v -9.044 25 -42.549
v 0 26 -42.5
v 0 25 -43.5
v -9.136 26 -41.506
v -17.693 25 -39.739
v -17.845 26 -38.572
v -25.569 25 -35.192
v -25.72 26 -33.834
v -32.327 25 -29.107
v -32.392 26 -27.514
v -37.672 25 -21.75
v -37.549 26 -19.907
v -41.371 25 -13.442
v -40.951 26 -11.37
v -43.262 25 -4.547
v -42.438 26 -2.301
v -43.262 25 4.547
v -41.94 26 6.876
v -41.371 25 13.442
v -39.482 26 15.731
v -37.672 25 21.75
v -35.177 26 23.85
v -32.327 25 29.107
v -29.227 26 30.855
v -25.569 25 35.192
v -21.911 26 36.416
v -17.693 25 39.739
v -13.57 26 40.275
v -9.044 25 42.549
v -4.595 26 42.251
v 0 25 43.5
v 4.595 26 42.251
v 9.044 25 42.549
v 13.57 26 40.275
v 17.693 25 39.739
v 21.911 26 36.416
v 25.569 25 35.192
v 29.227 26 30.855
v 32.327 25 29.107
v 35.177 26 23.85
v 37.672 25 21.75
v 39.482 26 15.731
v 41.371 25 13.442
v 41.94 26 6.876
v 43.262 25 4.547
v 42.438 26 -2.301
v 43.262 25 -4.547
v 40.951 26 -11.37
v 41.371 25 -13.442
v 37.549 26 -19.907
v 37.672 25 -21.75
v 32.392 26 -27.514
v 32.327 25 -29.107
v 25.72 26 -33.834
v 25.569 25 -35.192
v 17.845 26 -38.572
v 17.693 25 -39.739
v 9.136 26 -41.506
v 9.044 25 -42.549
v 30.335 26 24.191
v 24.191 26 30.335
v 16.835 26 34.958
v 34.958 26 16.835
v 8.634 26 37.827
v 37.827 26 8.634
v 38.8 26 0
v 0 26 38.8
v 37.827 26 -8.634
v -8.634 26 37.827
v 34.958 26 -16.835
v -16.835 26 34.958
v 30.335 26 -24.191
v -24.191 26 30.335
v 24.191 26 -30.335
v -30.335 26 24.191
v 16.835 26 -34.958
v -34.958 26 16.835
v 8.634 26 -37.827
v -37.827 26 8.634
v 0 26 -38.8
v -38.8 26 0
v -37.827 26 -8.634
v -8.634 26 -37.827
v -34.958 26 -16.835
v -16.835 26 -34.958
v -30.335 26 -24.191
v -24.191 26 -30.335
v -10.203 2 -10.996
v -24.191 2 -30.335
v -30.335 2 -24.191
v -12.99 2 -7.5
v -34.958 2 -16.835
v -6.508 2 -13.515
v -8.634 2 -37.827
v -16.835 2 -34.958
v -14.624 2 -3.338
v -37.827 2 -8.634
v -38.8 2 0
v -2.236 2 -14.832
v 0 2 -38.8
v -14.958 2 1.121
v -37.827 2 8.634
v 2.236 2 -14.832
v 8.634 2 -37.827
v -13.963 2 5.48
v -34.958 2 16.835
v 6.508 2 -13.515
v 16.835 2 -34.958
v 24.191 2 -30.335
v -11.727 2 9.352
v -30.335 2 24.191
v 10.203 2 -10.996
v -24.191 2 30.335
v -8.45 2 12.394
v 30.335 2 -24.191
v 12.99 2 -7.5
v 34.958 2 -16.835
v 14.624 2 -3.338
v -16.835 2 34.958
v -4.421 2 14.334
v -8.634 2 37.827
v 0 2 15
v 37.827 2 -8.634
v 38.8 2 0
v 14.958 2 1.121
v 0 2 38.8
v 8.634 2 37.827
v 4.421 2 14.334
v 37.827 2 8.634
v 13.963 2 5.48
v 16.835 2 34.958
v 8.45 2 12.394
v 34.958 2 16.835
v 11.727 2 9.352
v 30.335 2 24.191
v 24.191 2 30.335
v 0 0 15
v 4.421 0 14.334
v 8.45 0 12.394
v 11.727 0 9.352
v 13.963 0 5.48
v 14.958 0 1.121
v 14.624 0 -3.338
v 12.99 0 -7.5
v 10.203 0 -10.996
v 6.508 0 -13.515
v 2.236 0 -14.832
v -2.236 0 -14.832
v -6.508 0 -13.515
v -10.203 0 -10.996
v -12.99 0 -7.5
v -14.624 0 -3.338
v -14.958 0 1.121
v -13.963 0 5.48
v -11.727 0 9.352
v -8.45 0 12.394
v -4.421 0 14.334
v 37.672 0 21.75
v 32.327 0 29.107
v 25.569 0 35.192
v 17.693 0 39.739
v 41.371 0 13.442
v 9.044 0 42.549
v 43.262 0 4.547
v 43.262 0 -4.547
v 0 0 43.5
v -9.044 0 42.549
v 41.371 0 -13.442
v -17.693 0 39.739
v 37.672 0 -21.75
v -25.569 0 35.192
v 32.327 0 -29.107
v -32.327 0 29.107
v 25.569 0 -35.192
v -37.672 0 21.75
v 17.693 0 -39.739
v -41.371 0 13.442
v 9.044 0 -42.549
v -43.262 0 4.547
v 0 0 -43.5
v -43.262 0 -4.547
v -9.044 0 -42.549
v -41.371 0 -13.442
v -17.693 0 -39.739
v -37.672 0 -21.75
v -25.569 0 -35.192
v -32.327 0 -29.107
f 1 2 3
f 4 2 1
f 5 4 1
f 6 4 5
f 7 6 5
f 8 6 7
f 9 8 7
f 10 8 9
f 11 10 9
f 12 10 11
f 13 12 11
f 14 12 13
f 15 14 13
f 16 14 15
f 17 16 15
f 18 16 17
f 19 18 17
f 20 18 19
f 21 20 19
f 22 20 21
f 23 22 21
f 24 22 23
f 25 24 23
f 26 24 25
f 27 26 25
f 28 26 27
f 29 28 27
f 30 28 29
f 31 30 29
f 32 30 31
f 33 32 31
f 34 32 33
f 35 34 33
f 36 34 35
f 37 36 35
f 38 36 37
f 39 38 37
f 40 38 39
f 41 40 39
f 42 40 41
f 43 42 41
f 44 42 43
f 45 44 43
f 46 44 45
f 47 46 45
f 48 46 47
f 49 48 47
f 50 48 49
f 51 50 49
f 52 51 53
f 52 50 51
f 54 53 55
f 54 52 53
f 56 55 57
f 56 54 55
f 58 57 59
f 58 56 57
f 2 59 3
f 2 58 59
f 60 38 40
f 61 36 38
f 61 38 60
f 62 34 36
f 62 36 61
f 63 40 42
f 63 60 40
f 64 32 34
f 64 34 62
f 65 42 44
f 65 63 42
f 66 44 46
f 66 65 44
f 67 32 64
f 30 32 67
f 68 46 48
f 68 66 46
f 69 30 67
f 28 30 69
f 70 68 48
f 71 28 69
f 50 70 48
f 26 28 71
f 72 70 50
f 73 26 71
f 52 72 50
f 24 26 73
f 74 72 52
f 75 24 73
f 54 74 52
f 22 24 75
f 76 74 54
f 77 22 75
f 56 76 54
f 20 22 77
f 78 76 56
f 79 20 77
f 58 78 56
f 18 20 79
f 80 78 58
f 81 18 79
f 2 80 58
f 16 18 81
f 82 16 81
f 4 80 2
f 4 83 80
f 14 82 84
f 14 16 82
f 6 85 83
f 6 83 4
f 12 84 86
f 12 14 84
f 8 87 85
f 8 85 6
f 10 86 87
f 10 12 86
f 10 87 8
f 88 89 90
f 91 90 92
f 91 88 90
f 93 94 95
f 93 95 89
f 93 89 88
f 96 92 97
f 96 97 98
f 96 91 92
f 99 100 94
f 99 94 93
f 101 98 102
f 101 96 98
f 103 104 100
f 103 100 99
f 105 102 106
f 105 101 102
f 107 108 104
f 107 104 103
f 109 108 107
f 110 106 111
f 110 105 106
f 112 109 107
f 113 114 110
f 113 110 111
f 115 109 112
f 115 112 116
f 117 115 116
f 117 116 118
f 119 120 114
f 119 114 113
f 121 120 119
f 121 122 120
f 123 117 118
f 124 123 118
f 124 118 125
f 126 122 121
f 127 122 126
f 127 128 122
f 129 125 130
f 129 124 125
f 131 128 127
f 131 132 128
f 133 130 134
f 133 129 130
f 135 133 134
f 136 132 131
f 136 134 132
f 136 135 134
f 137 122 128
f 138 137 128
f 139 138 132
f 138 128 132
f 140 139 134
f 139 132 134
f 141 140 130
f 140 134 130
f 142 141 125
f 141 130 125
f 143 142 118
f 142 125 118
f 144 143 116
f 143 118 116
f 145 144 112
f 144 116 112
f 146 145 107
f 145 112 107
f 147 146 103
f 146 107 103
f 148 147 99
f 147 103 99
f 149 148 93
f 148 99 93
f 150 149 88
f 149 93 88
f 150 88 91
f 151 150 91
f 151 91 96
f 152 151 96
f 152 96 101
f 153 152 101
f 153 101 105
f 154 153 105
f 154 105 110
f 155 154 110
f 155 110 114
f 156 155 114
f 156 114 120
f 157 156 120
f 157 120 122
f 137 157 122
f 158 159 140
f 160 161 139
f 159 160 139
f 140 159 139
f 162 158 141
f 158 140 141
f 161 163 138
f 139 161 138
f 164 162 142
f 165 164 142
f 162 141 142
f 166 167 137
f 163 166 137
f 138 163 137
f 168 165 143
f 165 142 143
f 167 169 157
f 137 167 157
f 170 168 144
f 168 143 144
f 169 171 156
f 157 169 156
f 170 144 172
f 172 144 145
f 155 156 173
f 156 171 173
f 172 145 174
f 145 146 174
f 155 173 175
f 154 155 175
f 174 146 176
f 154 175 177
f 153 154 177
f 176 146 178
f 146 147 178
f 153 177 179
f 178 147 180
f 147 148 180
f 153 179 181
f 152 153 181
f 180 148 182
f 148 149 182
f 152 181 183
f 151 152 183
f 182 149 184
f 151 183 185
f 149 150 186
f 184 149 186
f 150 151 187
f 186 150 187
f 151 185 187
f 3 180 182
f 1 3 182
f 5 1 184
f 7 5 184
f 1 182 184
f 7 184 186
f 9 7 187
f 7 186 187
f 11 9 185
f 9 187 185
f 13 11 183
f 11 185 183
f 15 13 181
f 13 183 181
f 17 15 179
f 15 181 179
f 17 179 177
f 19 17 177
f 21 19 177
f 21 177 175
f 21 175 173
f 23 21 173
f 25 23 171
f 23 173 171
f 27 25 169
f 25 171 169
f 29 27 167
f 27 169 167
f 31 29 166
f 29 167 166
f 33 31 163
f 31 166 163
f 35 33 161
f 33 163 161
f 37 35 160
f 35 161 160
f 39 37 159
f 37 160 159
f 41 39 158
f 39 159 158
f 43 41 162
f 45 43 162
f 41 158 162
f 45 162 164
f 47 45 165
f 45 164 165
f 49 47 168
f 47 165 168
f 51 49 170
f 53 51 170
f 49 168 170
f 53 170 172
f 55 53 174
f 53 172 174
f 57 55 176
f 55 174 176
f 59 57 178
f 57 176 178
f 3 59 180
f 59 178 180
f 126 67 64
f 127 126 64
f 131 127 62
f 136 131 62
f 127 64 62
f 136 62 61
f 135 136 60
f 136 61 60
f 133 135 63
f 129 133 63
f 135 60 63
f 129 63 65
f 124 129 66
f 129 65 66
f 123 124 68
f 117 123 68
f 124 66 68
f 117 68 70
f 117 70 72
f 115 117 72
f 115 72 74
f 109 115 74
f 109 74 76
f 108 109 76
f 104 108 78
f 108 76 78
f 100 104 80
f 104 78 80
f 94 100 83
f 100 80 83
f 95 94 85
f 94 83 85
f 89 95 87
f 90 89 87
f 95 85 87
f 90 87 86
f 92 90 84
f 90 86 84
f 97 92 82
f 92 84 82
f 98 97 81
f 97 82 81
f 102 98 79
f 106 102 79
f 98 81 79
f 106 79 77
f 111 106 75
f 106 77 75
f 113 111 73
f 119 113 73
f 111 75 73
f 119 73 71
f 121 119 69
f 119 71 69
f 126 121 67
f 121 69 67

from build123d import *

# Parameters (mm, degrees)
SKETCH_1_R          = 43.5
EXTRUDE_1_DEPTH     = 26
SKETCH_2_R          = 38.8
CUT_EXTRUDE_1_DEPTH = 24
SKETCH_3_R          = 15
CUT_EXTRUDE_2_DEPTH = 67.034082109
CHAMFER_1_SIZE      = 1


with BuildPart() as part:
    # 草图1 → 凸台-拉伸1 (new body)
    with BuildSketch(Plane(origin=(0, 0, 0), x_dir=(1, 0, 0), z_dir=(0, 1, 0))):
        with Locations(Location((0, 0, 0), (0, 0, 90))):
            Circle(SKETCH_1_R)
    extrude(amount=EXTRUDE_1_DEPTH)

    # 草图2 → 切除-拉伸1 (cut)
    with BuildSketch(Plane(origin=(0, 26, 0), x_dir=(1, 0, 0), z_dir=(0, 1, 0))):
        with Locations(Location((0, 0, 0), (0, 0, 270))):
            Circle(SKETCH_2_R)
    extrude(amount=-CUT_EXTRUDE_1_DEPTH, mode=Mode.SUBTRACT)

    # 草图3 → 切除-拉伸2 (cut, through all)
    with BuildSketch(Plane(origin=(0, 2, 0), x_dir=(1, 0, 0), z_dir=(0, 1, 0))):
        with Locations(Location((0, 0, 0), (0, 0, 270))):
            Circle(SKETCH_3_R)
    extrude(amount=-CUT_EXTRUDE_2_DEPTH, mode=Mode.SUBTRACT)

    # 倒角1
    chamfer_1_edges = [part.edges().sort_by_distance(p)[0] for p in [
        (0, 26, 43.5),
    ]]
    chamfer(chamfer_1_edges, length=CHAMFER_1_SIZE)


solid = part.part
